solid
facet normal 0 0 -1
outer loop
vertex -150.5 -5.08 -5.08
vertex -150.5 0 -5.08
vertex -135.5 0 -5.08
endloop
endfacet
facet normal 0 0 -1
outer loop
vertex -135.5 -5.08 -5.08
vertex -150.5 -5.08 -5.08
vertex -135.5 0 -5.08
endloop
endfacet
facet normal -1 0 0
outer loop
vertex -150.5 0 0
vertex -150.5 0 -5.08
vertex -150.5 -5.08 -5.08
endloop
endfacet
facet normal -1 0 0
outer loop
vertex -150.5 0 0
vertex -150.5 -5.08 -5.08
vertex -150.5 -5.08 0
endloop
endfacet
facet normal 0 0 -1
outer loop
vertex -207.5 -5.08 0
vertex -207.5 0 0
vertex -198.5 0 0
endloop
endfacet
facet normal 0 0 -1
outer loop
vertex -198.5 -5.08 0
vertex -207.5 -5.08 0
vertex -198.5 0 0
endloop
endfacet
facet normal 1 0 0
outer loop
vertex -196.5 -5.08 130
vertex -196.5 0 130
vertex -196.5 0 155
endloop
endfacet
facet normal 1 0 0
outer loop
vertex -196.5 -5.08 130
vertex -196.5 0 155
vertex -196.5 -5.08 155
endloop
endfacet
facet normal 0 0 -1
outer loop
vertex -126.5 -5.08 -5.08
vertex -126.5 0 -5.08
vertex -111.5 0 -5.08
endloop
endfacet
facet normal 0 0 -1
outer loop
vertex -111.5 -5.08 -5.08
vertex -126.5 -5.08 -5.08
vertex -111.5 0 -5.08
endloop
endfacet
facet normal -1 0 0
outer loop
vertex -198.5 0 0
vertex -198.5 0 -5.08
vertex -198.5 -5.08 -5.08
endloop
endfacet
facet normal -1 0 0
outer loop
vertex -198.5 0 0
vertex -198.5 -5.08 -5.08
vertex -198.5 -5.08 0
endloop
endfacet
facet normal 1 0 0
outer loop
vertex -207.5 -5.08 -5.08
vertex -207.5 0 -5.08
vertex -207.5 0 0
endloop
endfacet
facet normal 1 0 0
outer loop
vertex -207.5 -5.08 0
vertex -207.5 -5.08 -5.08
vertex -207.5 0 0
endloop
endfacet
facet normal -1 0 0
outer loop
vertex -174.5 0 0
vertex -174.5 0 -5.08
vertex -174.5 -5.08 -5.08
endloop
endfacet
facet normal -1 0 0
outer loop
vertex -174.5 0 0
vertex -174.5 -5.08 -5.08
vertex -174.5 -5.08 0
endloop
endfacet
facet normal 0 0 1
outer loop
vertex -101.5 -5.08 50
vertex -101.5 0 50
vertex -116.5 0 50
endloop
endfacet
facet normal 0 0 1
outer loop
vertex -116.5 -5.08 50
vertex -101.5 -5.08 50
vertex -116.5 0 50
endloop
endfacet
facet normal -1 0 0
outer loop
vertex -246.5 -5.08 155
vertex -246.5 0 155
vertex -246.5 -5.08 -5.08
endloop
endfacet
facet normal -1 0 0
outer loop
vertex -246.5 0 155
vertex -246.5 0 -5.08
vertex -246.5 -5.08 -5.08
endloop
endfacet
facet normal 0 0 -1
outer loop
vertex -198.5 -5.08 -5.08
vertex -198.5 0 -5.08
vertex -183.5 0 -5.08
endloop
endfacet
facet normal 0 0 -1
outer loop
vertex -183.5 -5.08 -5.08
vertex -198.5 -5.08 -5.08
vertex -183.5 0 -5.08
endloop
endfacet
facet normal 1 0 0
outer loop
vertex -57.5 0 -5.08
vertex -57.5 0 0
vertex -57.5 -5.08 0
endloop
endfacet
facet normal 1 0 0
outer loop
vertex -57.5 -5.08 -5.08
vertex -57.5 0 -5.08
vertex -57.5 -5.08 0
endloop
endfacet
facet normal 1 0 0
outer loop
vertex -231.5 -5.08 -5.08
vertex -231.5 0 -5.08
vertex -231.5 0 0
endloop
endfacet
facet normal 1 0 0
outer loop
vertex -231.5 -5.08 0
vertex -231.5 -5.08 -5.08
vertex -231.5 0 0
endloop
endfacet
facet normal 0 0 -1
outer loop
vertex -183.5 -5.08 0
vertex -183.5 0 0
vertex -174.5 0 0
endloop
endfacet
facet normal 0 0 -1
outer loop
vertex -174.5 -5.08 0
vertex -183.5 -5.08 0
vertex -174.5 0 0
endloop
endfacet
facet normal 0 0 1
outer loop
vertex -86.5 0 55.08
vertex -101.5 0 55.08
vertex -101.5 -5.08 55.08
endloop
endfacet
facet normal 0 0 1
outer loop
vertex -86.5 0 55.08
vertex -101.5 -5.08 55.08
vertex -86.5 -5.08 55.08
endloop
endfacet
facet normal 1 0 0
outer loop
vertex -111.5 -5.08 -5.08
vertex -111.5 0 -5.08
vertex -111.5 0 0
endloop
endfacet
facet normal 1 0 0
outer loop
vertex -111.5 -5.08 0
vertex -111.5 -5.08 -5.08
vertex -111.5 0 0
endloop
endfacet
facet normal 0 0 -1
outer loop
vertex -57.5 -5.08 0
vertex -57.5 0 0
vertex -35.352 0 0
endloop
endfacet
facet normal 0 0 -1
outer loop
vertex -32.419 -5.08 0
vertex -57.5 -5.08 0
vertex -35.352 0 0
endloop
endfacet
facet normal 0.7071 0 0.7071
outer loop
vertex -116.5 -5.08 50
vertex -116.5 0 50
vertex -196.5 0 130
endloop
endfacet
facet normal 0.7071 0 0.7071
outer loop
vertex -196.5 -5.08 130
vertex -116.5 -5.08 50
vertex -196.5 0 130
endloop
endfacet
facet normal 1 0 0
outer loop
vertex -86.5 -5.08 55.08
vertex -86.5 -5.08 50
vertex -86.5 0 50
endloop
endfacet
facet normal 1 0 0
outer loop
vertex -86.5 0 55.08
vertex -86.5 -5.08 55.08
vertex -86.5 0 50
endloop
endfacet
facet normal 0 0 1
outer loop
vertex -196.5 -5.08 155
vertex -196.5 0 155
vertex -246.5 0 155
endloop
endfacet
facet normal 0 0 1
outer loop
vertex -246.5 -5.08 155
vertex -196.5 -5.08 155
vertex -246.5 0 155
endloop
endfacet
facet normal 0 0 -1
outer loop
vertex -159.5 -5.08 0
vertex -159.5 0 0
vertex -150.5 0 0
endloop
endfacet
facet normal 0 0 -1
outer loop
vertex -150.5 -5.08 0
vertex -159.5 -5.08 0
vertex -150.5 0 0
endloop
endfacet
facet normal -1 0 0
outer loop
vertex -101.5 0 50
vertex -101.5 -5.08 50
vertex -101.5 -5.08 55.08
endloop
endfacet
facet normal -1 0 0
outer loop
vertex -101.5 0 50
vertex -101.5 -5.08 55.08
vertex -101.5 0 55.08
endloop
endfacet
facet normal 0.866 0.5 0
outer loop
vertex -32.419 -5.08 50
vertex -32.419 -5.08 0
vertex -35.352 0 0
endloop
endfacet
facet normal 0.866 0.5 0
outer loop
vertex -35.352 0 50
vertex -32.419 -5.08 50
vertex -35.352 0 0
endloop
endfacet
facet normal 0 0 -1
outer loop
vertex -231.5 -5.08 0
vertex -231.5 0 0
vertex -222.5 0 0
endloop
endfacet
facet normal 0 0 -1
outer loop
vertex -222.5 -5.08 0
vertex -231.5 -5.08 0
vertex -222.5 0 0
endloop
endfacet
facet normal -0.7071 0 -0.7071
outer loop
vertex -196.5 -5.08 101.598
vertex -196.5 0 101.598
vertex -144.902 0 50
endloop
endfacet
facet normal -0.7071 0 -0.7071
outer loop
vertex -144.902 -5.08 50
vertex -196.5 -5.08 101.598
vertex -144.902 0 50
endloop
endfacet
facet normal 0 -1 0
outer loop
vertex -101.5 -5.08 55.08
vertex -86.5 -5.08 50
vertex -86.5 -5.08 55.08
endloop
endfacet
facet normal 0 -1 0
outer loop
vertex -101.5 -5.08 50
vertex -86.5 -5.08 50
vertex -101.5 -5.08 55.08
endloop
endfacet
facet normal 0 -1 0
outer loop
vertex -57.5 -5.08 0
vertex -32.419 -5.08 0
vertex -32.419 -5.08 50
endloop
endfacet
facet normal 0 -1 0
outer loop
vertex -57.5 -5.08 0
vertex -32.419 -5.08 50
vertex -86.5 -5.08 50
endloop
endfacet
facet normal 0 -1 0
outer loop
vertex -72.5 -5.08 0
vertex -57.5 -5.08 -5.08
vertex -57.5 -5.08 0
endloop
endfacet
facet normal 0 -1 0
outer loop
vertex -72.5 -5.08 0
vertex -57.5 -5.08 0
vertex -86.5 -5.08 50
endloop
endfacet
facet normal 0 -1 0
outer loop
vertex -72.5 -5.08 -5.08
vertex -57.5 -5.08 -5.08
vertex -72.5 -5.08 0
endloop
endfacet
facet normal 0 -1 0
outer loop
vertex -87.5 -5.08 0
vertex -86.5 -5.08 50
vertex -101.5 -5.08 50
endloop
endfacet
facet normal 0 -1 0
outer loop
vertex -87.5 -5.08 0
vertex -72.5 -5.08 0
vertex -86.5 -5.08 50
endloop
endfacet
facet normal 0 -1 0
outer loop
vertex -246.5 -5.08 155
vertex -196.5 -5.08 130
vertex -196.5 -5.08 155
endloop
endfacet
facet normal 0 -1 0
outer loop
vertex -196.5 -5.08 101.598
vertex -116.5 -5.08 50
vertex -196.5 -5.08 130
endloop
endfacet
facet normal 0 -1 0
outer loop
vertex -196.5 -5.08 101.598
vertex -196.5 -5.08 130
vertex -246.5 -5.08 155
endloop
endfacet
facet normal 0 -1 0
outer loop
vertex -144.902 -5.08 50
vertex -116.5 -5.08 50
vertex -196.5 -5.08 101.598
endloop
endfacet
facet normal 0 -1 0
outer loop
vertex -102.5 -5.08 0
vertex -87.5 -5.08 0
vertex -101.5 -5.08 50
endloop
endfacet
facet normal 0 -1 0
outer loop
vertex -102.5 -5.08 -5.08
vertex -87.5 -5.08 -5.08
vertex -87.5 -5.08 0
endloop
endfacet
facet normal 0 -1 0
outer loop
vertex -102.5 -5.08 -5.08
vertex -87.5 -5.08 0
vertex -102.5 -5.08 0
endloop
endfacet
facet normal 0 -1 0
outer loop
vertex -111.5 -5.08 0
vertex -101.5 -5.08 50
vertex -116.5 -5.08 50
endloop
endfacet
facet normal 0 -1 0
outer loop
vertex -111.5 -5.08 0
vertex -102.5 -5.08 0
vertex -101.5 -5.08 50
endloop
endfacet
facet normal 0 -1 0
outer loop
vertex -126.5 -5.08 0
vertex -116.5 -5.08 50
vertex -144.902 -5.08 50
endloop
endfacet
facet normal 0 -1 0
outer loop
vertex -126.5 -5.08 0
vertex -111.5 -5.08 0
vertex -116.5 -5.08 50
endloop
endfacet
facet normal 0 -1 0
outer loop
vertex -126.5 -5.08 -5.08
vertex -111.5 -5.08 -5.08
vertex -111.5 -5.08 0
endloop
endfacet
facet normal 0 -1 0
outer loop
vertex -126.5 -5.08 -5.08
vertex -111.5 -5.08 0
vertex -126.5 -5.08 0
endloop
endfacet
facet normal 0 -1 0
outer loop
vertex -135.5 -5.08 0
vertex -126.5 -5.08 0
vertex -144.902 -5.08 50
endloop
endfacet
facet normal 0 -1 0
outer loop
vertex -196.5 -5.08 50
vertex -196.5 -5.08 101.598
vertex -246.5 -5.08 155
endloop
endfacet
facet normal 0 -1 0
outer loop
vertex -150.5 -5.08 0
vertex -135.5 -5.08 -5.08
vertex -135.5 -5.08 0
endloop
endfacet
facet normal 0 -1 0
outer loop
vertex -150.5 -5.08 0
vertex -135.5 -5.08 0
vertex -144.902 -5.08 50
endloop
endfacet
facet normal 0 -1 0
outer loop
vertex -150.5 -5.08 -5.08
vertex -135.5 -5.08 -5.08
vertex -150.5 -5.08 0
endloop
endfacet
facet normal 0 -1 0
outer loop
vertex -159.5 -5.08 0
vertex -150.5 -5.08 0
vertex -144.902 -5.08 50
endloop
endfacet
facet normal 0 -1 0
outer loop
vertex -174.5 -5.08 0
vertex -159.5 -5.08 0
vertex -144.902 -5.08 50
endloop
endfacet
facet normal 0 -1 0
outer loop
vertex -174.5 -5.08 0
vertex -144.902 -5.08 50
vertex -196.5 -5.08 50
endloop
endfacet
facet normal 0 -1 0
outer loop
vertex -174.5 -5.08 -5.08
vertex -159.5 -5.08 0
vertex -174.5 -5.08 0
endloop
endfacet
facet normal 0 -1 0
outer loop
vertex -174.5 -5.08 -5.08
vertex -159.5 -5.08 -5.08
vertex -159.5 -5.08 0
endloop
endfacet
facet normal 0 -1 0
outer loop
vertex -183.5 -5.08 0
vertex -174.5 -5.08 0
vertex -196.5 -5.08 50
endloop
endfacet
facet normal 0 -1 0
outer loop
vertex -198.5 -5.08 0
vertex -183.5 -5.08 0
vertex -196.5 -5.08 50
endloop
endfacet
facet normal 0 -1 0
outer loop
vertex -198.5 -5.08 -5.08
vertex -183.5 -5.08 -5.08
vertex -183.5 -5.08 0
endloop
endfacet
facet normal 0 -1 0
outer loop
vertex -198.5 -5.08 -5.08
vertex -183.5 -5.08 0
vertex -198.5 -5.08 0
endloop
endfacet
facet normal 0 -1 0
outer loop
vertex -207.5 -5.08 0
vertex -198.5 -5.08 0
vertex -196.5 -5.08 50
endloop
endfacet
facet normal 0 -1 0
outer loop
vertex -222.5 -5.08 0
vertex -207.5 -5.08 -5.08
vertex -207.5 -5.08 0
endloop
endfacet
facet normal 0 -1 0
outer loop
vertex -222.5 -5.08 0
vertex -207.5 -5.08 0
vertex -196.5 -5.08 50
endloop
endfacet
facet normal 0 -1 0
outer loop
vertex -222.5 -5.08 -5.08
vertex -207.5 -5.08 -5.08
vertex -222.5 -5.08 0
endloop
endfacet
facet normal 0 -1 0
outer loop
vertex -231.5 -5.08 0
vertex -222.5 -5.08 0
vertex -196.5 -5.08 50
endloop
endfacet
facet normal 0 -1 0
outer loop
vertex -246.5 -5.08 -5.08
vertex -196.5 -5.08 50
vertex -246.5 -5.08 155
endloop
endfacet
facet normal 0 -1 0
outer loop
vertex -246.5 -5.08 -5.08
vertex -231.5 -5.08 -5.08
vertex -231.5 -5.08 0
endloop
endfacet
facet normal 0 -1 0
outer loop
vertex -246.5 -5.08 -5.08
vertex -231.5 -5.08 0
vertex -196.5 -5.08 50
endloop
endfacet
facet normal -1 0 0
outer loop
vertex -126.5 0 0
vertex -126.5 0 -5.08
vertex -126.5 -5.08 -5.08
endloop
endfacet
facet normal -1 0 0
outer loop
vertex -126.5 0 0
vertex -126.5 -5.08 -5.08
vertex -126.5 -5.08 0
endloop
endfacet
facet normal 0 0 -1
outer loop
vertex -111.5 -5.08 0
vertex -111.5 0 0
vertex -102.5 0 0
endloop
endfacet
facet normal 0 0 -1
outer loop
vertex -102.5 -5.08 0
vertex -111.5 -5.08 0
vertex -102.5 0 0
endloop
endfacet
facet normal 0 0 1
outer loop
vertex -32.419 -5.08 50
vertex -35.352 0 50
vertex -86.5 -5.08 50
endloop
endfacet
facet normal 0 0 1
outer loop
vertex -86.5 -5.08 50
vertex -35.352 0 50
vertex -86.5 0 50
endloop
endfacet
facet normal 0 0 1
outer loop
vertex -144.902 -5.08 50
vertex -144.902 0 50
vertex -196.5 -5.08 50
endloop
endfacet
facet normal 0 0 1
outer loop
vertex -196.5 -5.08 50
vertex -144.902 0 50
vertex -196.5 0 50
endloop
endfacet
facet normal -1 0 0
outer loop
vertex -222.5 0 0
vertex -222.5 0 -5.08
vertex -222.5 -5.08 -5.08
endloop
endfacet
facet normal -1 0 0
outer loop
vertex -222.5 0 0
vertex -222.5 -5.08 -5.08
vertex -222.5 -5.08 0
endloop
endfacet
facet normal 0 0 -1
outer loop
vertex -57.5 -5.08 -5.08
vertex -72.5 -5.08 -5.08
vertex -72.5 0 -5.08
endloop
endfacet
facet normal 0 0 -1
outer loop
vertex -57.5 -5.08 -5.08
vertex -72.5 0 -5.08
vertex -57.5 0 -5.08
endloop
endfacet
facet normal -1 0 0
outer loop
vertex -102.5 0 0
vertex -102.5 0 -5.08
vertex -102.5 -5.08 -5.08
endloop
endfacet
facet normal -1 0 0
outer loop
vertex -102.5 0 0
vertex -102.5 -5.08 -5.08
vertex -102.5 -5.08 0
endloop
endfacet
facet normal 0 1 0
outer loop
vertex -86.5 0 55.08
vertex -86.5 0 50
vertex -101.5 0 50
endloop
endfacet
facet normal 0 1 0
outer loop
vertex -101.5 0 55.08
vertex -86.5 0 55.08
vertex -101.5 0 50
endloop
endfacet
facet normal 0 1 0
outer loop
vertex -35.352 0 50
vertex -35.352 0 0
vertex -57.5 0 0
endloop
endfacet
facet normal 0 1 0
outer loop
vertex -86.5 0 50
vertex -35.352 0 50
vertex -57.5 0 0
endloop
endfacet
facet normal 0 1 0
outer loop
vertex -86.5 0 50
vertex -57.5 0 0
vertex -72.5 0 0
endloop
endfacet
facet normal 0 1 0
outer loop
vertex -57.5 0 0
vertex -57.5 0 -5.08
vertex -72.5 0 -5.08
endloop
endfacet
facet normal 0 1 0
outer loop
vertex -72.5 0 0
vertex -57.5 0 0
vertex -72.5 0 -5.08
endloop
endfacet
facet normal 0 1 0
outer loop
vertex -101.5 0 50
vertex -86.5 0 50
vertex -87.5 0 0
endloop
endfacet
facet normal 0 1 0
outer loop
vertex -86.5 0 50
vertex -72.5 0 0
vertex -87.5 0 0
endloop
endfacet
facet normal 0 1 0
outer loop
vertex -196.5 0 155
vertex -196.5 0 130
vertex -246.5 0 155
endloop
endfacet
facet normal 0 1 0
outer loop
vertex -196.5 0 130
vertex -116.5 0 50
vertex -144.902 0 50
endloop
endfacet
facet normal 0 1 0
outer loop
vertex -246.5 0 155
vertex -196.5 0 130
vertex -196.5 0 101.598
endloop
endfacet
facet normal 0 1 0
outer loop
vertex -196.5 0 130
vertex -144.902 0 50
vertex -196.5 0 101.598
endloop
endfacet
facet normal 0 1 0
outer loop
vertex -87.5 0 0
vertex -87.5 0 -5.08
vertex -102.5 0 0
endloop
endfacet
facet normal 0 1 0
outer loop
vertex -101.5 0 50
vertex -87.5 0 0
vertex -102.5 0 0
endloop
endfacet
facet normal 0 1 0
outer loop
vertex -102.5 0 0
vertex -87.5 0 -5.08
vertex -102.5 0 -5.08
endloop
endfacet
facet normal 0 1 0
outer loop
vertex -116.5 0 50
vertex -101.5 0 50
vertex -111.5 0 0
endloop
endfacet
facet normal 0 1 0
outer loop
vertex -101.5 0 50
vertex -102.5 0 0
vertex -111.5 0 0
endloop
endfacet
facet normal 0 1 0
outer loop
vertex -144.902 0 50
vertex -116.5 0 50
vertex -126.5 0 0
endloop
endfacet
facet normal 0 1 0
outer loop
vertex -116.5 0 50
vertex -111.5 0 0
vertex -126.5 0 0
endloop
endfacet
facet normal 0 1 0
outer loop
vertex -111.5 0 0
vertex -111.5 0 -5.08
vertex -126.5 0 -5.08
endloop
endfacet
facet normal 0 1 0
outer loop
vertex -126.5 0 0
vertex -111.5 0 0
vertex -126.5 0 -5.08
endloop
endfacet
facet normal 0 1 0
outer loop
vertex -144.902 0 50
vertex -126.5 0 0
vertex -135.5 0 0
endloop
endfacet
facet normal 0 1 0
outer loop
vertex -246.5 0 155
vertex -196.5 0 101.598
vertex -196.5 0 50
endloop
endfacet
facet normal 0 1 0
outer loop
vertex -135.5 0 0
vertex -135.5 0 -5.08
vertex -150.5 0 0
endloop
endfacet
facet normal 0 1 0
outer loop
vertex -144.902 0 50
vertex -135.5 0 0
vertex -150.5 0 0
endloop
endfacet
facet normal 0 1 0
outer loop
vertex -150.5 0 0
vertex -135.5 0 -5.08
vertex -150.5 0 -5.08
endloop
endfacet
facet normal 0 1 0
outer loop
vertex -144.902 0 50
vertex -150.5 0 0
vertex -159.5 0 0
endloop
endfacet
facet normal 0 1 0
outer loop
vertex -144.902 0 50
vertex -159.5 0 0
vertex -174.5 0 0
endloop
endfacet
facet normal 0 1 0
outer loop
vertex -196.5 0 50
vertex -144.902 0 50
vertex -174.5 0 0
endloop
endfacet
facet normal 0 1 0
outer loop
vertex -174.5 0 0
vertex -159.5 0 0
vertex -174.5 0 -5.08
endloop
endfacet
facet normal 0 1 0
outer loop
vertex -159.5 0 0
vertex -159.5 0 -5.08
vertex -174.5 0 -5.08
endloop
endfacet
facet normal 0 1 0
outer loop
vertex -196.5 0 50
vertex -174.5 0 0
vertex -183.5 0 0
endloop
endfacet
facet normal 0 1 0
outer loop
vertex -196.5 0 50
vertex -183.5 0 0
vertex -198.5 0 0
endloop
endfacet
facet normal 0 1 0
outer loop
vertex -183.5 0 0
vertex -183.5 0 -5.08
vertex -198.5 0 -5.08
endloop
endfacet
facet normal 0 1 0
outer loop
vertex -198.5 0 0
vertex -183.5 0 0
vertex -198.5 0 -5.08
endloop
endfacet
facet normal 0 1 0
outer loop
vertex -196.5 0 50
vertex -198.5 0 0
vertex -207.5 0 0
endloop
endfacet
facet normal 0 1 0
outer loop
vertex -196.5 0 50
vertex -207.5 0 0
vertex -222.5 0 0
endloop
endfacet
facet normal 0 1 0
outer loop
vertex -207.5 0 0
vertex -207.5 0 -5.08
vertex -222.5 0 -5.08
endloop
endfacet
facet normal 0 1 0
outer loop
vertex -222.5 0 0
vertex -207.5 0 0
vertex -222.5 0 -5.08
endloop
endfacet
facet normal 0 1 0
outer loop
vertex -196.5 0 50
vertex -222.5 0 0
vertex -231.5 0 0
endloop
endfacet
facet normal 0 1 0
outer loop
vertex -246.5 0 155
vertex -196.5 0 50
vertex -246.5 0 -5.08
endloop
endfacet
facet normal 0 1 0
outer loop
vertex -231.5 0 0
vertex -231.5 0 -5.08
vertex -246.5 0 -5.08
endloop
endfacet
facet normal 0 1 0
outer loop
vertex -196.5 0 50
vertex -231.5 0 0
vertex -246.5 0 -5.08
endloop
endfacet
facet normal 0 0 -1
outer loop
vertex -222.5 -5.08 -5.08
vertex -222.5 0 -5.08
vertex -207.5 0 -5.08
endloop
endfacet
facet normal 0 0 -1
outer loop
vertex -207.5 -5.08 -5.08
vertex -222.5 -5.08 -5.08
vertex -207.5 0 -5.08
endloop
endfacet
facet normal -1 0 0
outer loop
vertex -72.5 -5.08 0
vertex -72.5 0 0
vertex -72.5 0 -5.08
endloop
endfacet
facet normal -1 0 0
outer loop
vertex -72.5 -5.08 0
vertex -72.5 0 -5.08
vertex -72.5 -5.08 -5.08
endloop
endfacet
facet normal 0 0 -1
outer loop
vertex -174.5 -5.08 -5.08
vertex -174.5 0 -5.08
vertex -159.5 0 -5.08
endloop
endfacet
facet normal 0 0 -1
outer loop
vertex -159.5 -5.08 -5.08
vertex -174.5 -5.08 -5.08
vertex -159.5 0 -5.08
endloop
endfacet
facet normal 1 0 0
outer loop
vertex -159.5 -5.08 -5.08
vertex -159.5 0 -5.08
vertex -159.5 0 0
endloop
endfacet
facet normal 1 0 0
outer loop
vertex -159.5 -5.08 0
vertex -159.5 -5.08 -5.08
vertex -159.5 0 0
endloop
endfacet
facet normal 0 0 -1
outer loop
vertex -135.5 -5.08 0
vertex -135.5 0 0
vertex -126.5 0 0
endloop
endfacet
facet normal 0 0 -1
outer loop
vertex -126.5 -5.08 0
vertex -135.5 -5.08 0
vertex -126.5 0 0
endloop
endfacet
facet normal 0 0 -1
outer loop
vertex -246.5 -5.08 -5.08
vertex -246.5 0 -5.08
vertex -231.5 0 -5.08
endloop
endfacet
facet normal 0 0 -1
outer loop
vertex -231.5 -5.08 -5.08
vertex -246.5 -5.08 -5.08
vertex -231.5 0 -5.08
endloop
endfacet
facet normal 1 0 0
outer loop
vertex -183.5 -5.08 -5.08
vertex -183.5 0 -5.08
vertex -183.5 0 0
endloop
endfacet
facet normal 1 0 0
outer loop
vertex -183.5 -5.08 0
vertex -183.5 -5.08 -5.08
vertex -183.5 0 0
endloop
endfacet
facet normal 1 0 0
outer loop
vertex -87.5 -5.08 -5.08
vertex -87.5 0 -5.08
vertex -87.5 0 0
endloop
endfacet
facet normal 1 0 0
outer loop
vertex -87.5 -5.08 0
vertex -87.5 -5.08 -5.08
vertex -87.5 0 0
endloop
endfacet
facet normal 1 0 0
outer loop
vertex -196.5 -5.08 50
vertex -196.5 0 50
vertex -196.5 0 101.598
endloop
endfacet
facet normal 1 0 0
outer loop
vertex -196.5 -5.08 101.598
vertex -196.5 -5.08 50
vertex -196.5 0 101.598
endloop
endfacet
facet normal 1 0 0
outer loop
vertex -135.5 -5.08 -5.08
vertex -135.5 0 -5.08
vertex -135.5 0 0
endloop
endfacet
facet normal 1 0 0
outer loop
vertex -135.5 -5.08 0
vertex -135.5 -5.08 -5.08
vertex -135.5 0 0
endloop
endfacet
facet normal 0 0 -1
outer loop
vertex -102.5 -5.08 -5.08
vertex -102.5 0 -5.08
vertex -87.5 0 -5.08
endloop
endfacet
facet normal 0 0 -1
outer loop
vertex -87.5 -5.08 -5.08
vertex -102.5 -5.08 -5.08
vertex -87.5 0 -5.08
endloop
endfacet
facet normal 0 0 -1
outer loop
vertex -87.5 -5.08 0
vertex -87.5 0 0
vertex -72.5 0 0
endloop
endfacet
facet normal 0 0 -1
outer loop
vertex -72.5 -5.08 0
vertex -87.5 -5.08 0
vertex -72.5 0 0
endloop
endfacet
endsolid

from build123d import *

# Parameters (mm, degrees)
F0_W     = 15
F0_H     = 5.08
F1_DEPTH = 5.08
F2_DEPTH = 25
F4_DEPTH = 58
F5_W     = 15
F5_H     = 5.08
F6_DEPTH = 5.08
F7_W     = 15
F7_H     = 5.08
F8_DEPTH = 5.08


# Not quite as in the source:
# - a feature names something its author has since deleted; it is built from what else it names


with BuildPart() as f1:
    # F0 (on Front) → F1 (new body)
    with BuildSketch(Plane.XZ):
        Polygon((-87.5, 0), (-32.419, 0), (-32.419, 50), (-116.5, 50), (-144.9023774395, 50), (-196.5, 50), (-196.5, 101.5976225605), (-196.5, 130), (-246.5, 130), (-246.5, 0), (-231.5, 0), (-222.5, 0), (-207.5, 0), (-198.5, 0), (-183.5, 0), (-174.5, 0), (-159.5, 0), (-150.5, 0), (-135.5, 0), (-126.5, 0), (-111.5, 0), (-102.5, 0), align=None)
        with Locations((-95, -2.54)):
            Rectangle(F0_W, F0_H)
        Polygon((-144.9023774395, 50), (-116.5, 50), (-196.5, 130), (-196.5, 101.5976225605), align=None)
        with Locations((-119, -2.54)):
            Rectangle(F0_W, F0_H)
        with Locations((-143, -2.54)):
            Rectangle(F0_W, F0_H)
        with Locations((-239, -2.54)):
            Rectangle(F0_W, F0_H)
        with Locations((-167, -2.54)):
            Rectangle(F0_W, F0_H)
        with Locations((-215, -2.54)):
            Rectangle(F0_W, F0_H)
        with Locations((-191, -2.54)):
            Rectangle(F0_W, F0_H)
    extrude(amount=F1_DEPTH)

    # F2 (add): a face of the model
    f2_faces = [f1.faces().sort_by_distance(p)[0] for p in [
        (-221.5, -2.54, 130),
    ]]
    extrude(f2_faces, amount=F2_DEPTH)

    # F3 (on face) → F4 (cut)
    with BuildSketch(Plane(origin=(0, 0, 0), x_dir=(1, 0, 0), z_dir=(0, 0, -1))):
        Polygon((-32.419, 0), (-32.419, 5.08), (-35.3519393675, 0), align=None)
    extrude(amount=-F4_DEPTH, mode=Mode.SUBTRACT)

    # F5 (on face) → F6 (join)
    with BuildSketch(Plane(origin=(0, 0, 0), x_dir=(1, 0, 0), z_dir=(0, 0, -1))):
        with Locations((-65, 2.54)):
            Rectangle(F5_W, F5_H)
    extrude(amount=F6_DEPTH)

    # F7 (on face) → F8 (join)
    with BuildSketch(Plane.XY.offset(50)):
        with Locations((-94, -2.54)):
            Rectangle(F7_W, F7_H)
    extrude(amount=F8_DEPTH)


solid = f1.part
